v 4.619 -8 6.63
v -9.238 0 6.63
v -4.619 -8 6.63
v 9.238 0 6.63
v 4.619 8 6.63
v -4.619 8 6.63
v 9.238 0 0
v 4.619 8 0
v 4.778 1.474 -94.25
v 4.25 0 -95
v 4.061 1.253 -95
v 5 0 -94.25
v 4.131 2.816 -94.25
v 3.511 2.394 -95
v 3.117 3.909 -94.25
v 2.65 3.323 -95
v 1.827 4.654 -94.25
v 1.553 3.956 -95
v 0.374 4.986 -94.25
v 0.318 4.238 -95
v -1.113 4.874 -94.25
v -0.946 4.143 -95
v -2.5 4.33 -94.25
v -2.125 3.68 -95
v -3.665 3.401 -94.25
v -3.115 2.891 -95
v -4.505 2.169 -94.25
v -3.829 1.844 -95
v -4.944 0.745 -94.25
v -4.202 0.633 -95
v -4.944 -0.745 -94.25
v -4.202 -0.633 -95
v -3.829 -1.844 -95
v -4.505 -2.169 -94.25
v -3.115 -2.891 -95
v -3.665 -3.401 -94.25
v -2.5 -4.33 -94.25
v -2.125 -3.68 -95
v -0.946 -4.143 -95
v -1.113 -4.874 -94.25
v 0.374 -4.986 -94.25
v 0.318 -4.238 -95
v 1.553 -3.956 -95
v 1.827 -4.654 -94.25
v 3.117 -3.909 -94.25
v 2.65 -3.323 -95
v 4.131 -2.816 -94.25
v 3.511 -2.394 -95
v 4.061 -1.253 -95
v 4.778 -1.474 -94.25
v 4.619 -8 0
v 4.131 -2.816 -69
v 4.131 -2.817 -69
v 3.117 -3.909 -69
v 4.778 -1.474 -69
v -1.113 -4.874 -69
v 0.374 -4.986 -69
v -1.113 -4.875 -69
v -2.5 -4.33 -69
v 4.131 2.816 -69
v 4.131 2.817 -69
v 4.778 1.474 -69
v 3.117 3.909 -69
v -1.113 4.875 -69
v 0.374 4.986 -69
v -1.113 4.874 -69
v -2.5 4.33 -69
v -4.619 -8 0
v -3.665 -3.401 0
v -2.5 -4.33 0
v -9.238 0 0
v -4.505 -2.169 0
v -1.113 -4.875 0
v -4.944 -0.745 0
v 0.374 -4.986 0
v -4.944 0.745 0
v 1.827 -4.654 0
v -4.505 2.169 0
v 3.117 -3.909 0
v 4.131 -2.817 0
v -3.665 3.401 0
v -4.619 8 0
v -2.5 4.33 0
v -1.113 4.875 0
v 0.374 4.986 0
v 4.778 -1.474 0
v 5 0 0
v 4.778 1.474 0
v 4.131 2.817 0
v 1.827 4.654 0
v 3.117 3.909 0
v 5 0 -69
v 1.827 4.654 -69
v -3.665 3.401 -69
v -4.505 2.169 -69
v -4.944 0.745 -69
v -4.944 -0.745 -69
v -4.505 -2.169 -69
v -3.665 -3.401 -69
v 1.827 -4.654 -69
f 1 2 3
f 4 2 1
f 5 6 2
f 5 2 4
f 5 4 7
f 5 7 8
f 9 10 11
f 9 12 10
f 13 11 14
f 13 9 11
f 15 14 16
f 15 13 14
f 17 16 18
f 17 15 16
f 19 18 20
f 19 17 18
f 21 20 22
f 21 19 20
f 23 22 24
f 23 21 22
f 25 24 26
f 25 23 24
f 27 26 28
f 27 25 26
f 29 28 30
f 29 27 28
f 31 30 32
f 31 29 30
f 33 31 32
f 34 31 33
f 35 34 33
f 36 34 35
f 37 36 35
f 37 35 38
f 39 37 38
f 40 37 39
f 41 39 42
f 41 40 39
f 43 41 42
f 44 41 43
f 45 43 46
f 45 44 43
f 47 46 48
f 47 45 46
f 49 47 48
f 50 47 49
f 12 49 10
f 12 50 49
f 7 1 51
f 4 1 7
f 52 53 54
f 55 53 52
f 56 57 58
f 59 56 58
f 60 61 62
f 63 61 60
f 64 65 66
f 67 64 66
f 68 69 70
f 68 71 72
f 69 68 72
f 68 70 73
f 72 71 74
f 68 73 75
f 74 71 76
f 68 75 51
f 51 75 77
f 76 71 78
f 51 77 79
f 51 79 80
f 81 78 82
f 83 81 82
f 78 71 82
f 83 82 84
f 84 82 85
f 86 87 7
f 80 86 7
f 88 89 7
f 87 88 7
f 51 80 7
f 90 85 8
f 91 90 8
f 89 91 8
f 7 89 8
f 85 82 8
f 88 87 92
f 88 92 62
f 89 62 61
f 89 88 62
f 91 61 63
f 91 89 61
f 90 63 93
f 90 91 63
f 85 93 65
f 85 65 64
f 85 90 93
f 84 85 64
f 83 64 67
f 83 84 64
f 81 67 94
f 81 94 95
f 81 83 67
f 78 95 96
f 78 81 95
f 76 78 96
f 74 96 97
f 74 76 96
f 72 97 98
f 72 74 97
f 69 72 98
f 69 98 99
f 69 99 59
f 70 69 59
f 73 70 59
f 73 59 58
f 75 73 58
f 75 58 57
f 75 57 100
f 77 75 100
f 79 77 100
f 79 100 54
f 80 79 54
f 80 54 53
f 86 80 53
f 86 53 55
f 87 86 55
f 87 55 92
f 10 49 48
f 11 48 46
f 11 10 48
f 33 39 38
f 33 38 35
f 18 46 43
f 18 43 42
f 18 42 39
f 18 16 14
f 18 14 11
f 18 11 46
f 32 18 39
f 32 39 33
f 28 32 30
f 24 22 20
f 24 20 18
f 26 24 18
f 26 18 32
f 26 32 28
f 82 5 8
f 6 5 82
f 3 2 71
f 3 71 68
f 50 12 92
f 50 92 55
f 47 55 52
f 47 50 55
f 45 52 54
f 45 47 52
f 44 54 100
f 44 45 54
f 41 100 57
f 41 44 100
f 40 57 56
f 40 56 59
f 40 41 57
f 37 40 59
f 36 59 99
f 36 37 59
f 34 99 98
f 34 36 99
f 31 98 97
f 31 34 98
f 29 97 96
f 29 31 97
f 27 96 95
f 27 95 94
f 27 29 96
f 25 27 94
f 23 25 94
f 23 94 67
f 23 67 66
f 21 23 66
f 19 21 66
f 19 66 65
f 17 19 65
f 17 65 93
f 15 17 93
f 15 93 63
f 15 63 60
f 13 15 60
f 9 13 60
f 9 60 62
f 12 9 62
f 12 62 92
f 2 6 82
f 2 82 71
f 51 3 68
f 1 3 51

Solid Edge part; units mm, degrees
sketch "Sketch1" plane through (0, 0, 0) normal (0, 0, 1) x (1, 0, 0)
  circle A0 centre (0, 0) radius 9.28
  dimension "D1" = 18.56
extrude "Protrusion1" add sketch "Sketch1" along normal blind 6.63
sketch "Sketch2" plane through (0, 0, 0) normal (0, 0, -1) x (1, 0, 0)
  circle A0 centre (0, 0) radius 5
extrude "Protrusion2" add sketch "Sketch2" along normal blind 95
sketch "Sketch3" plane through (0, 0, -95) normal (0, 0, -1) x (1, 0, 0)
  circle A0 centre (0, 0) radius 4.9997
extrude "Cutout1" cut sketch "Sketch3" against normal blind 26 flip side to cut
chamfer "Chamfer_1" distance 0.75 angle 45 1 edges at (-4.9997, 0, -95)
sketch "Sketch4" plane through (0, 0, 6.63) normal (0, 0, 1) x (1, 0, 0)
  line L0 (-4.703, 8) -> (4.703, 8)
  dimension "D1" = 16
extrude "Cutout2" cut sketch "Sketch4" against normal up to next material side at (0, 8.05, 6.63)
pattern_circular "Pattern1" count 6 over 360 about axis through (0, 0, 6.63) along (0, 0, 1) of "Cutout2"
properties part number "185550" material "Stainless Steel, 304"
